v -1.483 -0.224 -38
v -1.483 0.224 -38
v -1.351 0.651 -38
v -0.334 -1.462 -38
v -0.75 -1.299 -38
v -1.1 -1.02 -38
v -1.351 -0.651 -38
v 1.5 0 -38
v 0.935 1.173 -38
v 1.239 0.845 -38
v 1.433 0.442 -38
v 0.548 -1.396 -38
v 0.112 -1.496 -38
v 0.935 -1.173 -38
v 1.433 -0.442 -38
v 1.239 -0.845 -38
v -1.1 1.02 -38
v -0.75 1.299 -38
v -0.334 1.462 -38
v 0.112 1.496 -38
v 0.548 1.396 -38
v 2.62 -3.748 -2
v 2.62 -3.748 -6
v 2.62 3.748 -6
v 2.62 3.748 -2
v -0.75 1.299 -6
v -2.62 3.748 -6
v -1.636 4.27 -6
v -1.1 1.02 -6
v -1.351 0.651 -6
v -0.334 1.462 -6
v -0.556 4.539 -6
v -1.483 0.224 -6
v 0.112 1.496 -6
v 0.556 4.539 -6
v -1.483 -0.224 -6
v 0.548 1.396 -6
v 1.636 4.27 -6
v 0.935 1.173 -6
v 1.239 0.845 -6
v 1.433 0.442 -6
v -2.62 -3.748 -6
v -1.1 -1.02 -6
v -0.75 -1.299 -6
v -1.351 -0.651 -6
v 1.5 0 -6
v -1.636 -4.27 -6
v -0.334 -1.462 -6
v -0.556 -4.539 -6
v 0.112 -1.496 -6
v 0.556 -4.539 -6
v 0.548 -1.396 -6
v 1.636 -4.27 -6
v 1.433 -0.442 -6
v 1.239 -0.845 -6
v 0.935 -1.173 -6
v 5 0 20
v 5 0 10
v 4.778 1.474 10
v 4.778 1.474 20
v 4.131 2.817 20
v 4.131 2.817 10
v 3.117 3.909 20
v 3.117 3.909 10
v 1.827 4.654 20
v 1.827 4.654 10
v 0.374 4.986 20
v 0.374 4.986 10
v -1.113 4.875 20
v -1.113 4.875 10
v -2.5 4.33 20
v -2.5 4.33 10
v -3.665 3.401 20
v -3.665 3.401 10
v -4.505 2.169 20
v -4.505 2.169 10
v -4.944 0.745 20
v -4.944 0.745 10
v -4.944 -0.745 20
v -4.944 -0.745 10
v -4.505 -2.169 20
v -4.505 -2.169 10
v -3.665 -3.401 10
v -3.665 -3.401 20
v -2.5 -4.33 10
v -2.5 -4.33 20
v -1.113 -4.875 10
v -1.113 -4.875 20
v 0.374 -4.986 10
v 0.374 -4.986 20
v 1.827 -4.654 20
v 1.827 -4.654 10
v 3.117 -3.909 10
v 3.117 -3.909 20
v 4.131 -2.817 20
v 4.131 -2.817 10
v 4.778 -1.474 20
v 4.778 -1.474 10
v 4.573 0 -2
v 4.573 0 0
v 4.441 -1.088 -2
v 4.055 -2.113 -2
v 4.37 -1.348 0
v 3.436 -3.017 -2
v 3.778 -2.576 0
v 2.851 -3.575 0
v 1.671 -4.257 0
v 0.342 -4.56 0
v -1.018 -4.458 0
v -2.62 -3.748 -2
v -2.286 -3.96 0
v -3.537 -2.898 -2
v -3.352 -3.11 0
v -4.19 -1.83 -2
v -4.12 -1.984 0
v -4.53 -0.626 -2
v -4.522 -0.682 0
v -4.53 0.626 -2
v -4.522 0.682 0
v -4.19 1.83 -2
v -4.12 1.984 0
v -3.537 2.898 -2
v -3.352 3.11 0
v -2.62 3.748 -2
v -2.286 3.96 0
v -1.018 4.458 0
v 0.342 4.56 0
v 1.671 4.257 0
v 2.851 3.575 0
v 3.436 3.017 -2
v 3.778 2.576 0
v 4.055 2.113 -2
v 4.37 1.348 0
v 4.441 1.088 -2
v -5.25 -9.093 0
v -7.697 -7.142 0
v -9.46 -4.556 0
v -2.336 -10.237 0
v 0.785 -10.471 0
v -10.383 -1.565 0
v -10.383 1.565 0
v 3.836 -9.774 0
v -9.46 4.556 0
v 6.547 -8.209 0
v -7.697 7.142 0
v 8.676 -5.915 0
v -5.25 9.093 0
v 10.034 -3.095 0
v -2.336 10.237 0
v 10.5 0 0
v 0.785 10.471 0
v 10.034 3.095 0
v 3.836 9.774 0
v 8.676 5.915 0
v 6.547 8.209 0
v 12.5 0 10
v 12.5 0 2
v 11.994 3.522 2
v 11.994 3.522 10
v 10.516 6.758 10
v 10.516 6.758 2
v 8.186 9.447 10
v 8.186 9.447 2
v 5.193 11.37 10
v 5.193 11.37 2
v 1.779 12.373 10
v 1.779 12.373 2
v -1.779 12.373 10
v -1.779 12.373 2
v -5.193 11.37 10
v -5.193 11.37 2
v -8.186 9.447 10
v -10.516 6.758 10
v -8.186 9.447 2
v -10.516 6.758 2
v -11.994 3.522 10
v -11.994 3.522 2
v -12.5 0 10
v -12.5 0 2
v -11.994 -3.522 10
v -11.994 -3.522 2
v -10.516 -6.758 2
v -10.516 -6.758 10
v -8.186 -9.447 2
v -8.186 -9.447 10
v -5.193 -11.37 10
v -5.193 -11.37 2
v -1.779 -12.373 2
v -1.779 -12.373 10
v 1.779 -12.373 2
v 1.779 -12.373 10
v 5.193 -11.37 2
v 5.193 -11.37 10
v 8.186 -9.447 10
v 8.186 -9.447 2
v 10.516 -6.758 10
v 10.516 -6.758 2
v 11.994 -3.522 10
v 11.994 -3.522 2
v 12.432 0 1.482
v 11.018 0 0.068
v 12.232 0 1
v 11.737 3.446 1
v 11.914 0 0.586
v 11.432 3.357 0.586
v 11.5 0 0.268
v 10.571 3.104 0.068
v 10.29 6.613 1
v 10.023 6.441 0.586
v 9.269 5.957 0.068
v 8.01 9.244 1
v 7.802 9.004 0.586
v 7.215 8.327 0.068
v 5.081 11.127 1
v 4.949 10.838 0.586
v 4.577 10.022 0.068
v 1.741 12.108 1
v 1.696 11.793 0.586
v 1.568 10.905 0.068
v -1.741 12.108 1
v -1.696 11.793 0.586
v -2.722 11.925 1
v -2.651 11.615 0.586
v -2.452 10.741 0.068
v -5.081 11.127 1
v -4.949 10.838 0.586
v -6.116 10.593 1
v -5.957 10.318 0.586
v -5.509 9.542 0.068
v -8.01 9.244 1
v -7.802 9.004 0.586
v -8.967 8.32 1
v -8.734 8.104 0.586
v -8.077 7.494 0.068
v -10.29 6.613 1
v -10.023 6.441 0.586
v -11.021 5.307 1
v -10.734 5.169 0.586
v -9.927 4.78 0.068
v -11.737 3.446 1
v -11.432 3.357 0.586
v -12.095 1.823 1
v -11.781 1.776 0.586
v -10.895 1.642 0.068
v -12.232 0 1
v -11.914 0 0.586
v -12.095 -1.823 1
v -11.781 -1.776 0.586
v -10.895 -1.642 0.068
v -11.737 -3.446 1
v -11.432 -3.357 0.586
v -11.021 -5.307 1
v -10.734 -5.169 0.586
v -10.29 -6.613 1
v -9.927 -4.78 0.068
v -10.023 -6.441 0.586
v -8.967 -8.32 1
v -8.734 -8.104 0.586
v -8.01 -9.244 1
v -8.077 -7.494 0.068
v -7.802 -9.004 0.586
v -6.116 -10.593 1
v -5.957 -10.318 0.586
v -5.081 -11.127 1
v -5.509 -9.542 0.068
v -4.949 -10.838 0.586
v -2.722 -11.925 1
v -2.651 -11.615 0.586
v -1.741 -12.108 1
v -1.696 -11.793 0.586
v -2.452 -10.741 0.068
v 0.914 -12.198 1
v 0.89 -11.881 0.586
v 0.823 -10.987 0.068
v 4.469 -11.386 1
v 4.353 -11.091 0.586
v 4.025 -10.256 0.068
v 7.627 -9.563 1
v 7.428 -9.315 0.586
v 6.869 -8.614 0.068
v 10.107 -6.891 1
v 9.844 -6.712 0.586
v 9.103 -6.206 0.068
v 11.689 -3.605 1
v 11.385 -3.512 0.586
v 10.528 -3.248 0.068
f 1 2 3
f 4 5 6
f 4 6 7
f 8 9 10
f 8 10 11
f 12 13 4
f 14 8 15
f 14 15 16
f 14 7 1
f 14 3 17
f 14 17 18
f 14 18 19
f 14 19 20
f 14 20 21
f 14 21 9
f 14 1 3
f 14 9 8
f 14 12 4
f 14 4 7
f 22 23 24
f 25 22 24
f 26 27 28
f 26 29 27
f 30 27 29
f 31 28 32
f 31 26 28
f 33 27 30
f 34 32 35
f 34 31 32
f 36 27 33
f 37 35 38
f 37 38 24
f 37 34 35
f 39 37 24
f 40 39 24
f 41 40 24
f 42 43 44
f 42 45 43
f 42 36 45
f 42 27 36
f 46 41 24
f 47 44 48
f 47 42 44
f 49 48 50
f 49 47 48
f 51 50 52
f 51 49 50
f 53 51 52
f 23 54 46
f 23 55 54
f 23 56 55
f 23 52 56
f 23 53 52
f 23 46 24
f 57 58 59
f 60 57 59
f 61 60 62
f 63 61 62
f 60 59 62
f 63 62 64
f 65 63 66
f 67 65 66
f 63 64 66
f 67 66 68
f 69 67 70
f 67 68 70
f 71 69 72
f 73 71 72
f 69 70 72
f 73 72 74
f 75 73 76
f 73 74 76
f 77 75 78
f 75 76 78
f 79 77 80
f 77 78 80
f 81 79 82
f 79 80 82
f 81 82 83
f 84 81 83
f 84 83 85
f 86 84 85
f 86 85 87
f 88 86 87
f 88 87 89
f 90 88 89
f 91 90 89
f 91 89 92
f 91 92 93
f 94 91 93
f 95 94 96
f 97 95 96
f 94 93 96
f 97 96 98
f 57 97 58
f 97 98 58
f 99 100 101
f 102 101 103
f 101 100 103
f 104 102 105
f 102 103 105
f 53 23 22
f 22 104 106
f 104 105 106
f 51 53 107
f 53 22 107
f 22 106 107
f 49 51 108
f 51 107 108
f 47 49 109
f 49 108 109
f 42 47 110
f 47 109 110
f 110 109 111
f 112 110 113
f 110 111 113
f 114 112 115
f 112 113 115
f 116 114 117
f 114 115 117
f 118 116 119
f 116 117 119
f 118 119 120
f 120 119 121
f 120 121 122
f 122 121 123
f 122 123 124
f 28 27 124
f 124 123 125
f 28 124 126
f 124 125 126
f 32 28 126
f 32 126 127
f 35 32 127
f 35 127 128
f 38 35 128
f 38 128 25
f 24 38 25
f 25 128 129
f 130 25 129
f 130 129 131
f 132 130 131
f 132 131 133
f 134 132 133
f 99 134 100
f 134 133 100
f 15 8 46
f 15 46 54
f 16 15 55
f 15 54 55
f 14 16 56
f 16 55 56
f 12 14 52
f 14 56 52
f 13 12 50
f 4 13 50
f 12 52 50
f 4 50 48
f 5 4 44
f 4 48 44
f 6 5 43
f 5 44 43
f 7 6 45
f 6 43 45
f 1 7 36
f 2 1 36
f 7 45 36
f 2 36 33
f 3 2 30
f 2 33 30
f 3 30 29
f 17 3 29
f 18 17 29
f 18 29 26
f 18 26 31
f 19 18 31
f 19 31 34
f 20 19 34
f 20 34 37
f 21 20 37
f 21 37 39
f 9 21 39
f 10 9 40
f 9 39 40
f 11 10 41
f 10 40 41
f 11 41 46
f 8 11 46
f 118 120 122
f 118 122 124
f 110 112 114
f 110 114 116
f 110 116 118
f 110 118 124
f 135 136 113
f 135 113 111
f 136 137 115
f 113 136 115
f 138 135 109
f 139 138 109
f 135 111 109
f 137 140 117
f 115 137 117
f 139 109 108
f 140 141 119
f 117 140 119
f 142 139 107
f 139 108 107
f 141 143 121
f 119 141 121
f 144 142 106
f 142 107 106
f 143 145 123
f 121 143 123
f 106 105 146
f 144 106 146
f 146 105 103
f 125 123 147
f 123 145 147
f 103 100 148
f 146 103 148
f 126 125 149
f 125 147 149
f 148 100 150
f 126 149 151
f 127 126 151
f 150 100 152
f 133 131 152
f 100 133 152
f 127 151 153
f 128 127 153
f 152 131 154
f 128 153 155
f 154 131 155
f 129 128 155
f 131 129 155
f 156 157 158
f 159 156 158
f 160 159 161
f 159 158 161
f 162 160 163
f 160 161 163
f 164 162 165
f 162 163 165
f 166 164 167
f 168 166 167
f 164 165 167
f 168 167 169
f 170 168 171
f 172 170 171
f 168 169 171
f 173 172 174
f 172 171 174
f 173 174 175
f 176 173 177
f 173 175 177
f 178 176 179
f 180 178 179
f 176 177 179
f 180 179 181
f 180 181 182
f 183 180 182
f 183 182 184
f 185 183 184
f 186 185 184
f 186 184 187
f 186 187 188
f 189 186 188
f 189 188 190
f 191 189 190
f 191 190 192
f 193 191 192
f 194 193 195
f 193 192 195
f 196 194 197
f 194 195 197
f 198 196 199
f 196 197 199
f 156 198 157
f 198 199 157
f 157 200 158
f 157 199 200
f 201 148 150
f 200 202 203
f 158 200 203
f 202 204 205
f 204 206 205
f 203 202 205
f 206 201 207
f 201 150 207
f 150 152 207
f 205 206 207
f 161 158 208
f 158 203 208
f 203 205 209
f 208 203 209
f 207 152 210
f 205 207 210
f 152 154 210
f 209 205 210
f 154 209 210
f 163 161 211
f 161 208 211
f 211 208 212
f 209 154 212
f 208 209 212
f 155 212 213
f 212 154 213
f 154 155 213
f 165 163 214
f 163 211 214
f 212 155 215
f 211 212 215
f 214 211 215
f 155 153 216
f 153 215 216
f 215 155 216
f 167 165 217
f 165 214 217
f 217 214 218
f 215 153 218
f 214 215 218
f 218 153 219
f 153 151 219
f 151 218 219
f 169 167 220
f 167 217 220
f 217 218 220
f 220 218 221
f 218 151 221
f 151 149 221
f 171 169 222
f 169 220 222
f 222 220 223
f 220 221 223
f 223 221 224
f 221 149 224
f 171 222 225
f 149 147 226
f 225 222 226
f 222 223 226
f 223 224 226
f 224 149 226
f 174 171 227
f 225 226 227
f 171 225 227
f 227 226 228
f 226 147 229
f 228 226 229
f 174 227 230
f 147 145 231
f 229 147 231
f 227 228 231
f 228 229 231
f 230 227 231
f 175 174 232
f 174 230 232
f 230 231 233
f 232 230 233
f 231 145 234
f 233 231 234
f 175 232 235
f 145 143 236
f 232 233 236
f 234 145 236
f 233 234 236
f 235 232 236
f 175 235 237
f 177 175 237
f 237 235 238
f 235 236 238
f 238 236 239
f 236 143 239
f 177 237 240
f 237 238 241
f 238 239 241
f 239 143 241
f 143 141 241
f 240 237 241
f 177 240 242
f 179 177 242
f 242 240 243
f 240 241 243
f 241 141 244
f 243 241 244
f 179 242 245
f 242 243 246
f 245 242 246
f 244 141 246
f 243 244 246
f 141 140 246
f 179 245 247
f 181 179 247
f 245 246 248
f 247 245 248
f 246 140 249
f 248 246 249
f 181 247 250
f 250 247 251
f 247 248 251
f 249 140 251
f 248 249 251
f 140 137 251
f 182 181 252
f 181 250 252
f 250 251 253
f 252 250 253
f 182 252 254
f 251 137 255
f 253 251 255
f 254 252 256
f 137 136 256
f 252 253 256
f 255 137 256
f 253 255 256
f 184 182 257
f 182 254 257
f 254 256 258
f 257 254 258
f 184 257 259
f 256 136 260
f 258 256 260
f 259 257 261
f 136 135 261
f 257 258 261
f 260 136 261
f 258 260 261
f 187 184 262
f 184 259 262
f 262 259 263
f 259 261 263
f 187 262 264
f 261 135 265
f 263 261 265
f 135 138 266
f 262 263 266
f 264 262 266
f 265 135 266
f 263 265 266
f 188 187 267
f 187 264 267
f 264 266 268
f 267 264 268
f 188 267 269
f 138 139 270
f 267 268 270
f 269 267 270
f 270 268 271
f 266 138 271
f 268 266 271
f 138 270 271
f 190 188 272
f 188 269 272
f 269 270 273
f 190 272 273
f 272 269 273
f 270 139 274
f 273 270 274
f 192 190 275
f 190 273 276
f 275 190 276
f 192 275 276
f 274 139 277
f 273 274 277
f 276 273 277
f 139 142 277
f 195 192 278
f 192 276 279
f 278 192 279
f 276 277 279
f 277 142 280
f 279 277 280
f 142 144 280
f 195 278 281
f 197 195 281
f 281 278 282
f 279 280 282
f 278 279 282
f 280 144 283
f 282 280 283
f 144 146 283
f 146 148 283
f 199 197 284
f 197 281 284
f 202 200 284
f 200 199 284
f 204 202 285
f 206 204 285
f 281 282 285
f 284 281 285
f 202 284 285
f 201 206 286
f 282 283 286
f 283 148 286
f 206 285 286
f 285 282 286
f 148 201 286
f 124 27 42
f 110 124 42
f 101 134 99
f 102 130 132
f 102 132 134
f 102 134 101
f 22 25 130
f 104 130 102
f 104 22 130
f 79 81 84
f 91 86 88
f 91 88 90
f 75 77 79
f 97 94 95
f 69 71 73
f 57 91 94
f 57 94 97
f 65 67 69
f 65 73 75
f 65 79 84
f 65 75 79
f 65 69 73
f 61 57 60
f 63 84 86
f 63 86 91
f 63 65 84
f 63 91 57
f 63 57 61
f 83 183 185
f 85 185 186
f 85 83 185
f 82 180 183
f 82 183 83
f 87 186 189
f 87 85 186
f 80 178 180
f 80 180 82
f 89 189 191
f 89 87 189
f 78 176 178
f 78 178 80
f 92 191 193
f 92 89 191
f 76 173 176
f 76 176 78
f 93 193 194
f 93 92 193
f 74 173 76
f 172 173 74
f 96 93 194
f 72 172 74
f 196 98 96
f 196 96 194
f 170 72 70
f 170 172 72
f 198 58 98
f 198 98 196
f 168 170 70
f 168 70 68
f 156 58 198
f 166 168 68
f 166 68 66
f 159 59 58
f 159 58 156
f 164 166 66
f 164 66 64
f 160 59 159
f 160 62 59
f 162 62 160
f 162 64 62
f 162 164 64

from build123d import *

# Parameters (mm, degrees)
F0_R      = 12.5
F1_DEPTH  = 10
F2_R      = 5
F3_DEPTH  = 10
F4_R      = 4.572682
F5_DEPTH  = 6
F6_R      = 1.5
F7_DEPTH  = 32
F8_R      = 2
F10_DEPTH = 4


with BuildPart() as f1:
    # F0 (on Top) → F1 (new body)
    with BuildSketch(Plane.XY):
        Circle(F0_R)
    extrude(amount=F1_DEPTH)

    # F2 (on face) → F3 (join)
    with BuildSketch(Plane.XY.offset(10)):
        Circle(F2_R)
    extrude(amount=F3_DEPTH)

    # F4 (on face) → F5 (join)
    with BuildSketch(Plane(origin=(0, 0, 0), x_dir=(1, 0, 0), z_dir=(0, 0, -1))):
        Circle(F4_R)
    extrude(amount=F5_DEPTH)

    # F6 (on face) → F7 (join)
    with BuildSketch(Plane(origin=(0, 0, -6), x_dir=(1, 0, 0), z_dir=(0, 0, -1))):
        Circle(F6_R)
    extrude(amount=F7_DEPTH)

    # F8
    f8_edges = [f1.edges().sort_by_distance(p)[0] for p in [
        (-12.5, 0, 0),
    ]]
    fillet(f8_edges, radius=F8_R)

    # F9 (on face) → F10 (cut)
    with BuildSketch(Plane(origin=(0, 0, -6), x_dir=(1, 0, 0), z_dir=(0, 0, -1))):
        with BuildLine():
            ThreePointArc((4.572682, 0), (4.055107, 2.113179), (2.61955, 3.747983))
            Line((2.61955, 3.747983), (2.61955, -3.747983))
            ThreePointArc((2.61955, -3.747983), (4.055107, -2.113179), (4.572682, 0))
        make_face()
        with BuildLine():
            Line((-2.61955, -3.747983), (-2.61955, 3.747983))
            ThreePointArc((-2.61955, 3.747983), (-4.572682, 0), (-2.61955, -3.747983))
        make_face()
    extrude(amount=-F10_DEPTH, mode=Mode.SUBTRACT)


solid = f1.part
